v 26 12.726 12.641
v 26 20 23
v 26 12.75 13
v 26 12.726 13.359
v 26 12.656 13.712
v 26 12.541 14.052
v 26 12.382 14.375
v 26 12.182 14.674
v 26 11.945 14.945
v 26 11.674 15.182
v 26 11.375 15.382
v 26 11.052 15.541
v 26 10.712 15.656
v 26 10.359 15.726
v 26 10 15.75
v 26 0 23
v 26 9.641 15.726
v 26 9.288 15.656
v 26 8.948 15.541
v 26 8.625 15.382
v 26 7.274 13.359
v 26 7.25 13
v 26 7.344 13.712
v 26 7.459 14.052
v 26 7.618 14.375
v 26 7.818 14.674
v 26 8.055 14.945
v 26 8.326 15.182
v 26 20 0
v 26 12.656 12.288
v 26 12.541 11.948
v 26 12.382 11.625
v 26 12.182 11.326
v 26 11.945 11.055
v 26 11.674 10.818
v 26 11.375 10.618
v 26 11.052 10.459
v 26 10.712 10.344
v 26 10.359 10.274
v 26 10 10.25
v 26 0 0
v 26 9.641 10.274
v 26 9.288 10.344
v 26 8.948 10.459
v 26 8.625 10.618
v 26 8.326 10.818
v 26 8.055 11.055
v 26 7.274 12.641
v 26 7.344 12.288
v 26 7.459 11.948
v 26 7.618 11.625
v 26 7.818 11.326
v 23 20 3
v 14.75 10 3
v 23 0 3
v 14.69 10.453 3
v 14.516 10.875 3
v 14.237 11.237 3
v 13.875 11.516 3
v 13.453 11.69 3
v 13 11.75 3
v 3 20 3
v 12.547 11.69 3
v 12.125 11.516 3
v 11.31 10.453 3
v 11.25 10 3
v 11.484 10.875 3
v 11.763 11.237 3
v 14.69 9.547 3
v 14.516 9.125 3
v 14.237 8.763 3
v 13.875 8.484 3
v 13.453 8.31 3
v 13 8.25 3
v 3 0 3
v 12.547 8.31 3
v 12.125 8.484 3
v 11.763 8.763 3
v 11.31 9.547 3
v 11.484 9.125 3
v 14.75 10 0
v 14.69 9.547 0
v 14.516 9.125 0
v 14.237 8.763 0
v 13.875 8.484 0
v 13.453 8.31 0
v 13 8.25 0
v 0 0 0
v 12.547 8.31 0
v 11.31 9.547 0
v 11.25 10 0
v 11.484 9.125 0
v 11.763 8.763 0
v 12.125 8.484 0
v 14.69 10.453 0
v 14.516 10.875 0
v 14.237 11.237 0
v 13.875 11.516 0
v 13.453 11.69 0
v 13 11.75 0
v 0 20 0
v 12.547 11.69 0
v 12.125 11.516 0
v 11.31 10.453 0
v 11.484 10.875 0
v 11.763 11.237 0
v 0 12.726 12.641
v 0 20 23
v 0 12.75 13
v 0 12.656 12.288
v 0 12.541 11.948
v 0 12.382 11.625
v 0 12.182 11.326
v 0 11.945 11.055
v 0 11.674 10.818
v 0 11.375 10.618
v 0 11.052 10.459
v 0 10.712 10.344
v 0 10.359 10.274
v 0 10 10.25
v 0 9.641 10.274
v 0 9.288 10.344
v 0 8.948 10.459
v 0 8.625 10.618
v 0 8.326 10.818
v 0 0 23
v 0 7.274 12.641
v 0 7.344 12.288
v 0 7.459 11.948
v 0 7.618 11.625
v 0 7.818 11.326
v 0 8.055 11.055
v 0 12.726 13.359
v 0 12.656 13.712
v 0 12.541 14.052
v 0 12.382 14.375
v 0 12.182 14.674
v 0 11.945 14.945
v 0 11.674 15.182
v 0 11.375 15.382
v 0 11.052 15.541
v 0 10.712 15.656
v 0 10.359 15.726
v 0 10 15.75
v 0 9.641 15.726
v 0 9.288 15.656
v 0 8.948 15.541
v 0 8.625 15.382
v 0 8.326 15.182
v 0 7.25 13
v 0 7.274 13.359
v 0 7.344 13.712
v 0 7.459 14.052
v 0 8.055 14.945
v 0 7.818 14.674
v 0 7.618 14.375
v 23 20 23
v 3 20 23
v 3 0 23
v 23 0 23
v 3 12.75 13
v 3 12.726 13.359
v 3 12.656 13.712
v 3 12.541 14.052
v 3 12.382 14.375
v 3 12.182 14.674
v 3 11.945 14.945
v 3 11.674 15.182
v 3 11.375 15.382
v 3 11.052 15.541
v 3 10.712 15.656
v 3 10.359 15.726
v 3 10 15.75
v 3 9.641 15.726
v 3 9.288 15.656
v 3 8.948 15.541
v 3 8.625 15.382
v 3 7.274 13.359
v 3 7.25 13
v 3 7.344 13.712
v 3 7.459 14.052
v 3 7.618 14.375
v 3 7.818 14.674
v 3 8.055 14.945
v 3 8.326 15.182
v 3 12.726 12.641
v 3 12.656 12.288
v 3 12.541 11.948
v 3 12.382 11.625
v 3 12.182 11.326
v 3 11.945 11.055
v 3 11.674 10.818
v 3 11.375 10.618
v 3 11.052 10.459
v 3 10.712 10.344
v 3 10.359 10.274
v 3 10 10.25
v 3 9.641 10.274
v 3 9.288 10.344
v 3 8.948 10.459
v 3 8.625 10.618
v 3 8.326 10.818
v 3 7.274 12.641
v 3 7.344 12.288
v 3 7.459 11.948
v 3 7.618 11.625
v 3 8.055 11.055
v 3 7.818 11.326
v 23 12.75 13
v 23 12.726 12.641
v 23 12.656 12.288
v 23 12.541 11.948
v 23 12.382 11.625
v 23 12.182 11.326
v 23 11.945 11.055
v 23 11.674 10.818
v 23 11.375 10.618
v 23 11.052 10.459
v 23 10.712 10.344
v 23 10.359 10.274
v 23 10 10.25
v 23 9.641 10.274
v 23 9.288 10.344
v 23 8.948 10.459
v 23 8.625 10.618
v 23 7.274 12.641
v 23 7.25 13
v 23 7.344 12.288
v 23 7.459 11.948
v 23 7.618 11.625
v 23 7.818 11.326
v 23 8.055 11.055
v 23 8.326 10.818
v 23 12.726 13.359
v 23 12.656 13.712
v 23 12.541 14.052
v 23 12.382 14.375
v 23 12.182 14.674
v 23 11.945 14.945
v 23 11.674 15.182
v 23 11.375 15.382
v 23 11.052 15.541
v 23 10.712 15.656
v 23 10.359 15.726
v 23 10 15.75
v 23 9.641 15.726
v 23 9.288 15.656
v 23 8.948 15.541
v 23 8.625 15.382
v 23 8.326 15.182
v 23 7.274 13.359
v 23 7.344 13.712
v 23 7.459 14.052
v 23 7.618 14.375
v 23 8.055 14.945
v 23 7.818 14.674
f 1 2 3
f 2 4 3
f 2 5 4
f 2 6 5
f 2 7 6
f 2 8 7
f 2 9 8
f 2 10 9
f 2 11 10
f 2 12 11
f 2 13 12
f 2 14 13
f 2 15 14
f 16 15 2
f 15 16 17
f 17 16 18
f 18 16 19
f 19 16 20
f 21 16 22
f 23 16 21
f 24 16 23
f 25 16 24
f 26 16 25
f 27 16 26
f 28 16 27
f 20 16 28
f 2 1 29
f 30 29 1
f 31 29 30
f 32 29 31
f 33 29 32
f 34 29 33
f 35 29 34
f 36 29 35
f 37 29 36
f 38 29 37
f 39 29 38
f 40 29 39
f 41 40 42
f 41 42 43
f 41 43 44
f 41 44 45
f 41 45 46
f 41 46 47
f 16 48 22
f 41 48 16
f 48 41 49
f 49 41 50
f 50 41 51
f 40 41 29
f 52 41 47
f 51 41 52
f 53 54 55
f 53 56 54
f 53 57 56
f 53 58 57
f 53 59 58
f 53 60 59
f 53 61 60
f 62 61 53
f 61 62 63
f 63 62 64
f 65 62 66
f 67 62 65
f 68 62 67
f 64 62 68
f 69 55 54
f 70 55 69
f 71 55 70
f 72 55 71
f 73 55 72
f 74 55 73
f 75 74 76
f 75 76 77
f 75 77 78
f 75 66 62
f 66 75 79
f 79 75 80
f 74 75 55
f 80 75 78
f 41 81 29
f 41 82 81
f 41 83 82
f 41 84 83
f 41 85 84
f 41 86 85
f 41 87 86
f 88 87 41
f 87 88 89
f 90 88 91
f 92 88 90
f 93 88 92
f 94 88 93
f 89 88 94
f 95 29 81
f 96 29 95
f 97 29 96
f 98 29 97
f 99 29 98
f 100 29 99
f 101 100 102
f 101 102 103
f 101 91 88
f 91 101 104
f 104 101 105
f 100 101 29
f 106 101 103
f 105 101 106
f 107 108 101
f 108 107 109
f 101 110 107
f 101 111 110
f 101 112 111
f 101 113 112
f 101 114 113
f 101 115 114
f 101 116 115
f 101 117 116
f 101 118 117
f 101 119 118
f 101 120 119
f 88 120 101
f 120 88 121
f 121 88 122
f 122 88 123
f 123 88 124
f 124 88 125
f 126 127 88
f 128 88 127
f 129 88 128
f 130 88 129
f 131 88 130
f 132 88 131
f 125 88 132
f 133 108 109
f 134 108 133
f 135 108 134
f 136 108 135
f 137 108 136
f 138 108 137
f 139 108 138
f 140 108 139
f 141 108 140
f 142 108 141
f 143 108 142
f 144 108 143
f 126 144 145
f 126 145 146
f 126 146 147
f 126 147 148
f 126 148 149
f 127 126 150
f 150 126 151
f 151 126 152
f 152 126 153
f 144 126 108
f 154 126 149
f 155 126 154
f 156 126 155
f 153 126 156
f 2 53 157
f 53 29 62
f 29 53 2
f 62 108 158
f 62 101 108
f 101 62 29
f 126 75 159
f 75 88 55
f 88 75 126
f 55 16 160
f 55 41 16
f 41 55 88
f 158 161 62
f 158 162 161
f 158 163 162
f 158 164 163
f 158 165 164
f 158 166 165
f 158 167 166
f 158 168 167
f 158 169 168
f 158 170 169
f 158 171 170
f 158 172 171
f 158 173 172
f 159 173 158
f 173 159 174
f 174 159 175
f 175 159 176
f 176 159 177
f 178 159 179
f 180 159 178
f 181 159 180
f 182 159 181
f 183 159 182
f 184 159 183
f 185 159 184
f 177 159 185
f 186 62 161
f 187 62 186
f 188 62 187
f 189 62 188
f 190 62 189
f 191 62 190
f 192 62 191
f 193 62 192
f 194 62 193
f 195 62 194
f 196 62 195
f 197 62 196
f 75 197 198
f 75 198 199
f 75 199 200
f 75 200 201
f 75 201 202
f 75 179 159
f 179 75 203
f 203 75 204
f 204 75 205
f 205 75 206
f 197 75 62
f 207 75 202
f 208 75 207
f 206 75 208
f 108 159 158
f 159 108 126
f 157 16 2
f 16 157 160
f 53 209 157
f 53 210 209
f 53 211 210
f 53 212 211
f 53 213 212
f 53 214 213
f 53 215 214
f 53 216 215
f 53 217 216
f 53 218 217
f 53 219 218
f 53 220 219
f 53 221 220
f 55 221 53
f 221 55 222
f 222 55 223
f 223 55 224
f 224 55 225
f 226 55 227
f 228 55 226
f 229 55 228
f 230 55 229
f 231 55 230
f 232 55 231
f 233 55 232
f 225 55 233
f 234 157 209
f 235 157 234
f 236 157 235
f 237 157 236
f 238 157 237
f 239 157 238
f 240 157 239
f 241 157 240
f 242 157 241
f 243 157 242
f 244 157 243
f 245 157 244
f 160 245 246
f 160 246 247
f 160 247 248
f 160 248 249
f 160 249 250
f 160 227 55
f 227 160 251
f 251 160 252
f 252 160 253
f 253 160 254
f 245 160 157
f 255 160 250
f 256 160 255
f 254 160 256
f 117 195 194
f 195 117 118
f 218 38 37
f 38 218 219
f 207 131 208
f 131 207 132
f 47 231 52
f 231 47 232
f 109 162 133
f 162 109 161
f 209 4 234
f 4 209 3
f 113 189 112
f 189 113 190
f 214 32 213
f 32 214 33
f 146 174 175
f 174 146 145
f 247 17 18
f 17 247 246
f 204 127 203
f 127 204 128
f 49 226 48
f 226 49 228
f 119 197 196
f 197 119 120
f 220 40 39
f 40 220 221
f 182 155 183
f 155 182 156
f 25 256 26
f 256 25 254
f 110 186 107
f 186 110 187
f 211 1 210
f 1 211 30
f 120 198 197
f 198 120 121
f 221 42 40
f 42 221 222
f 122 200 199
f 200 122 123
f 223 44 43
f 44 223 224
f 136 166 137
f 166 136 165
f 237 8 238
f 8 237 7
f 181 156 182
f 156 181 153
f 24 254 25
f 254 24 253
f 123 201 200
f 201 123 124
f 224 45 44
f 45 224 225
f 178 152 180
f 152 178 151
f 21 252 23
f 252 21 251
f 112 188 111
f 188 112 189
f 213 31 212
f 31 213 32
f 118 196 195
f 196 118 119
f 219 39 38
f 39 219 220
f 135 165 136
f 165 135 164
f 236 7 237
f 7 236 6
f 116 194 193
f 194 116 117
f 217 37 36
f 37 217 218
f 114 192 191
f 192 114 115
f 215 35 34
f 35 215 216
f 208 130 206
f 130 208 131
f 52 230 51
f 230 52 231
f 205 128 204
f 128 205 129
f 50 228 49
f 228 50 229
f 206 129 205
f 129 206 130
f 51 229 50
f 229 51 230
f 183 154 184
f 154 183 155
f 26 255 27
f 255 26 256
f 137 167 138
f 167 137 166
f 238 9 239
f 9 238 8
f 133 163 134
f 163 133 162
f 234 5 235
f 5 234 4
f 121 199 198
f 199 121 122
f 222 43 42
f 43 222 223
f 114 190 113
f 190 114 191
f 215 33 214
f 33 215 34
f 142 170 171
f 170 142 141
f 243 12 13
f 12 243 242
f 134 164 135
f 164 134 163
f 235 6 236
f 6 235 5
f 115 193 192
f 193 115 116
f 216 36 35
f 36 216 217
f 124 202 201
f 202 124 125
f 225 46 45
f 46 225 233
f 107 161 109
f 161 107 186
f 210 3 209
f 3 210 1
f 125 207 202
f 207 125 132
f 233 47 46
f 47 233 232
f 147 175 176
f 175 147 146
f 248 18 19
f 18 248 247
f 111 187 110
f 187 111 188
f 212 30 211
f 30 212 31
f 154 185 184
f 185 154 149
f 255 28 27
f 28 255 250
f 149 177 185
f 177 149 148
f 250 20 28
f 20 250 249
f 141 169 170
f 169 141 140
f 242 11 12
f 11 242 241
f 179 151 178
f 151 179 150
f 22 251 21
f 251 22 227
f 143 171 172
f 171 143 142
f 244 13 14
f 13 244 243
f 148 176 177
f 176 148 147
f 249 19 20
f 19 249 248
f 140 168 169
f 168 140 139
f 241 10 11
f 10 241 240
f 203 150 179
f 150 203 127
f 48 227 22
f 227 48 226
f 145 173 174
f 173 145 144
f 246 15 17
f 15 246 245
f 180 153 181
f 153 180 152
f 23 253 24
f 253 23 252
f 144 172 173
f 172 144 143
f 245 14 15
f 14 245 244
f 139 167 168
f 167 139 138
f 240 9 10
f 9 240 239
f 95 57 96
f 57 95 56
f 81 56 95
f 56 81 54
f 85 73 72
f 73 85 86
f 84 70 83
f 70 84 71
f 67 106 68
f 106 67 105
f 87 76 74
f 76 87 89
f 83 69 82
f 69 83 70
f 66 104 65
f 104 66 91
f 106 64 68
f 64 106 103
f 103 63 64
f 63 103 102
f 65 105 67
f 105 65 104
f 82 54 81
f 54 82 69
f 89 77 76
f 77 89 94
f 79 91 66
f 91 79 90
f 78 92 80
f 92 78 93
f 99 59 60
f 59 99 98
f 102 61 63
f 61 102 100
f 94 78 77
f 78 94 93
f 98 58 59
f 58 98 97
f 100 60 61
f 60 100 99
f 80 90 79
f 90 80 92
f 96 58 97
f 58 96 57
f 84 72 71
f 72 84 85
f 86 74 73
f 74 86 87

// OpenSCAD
difference()
{
    union()
    {
        cube([26,20,3]);
        
        cube([3,20,23]);
        
        translate([23,0,0])
            cube([3,20,23]);
    }
    union()
    {
        translate([0,10,13])
            rotate([0,90,0])
                cylinder(d=5.5,h=27,$fn=48);
        
        translate([10+3,10,0])
            cylinder(d=3.5,h=10,$fn=24);
    }
}
